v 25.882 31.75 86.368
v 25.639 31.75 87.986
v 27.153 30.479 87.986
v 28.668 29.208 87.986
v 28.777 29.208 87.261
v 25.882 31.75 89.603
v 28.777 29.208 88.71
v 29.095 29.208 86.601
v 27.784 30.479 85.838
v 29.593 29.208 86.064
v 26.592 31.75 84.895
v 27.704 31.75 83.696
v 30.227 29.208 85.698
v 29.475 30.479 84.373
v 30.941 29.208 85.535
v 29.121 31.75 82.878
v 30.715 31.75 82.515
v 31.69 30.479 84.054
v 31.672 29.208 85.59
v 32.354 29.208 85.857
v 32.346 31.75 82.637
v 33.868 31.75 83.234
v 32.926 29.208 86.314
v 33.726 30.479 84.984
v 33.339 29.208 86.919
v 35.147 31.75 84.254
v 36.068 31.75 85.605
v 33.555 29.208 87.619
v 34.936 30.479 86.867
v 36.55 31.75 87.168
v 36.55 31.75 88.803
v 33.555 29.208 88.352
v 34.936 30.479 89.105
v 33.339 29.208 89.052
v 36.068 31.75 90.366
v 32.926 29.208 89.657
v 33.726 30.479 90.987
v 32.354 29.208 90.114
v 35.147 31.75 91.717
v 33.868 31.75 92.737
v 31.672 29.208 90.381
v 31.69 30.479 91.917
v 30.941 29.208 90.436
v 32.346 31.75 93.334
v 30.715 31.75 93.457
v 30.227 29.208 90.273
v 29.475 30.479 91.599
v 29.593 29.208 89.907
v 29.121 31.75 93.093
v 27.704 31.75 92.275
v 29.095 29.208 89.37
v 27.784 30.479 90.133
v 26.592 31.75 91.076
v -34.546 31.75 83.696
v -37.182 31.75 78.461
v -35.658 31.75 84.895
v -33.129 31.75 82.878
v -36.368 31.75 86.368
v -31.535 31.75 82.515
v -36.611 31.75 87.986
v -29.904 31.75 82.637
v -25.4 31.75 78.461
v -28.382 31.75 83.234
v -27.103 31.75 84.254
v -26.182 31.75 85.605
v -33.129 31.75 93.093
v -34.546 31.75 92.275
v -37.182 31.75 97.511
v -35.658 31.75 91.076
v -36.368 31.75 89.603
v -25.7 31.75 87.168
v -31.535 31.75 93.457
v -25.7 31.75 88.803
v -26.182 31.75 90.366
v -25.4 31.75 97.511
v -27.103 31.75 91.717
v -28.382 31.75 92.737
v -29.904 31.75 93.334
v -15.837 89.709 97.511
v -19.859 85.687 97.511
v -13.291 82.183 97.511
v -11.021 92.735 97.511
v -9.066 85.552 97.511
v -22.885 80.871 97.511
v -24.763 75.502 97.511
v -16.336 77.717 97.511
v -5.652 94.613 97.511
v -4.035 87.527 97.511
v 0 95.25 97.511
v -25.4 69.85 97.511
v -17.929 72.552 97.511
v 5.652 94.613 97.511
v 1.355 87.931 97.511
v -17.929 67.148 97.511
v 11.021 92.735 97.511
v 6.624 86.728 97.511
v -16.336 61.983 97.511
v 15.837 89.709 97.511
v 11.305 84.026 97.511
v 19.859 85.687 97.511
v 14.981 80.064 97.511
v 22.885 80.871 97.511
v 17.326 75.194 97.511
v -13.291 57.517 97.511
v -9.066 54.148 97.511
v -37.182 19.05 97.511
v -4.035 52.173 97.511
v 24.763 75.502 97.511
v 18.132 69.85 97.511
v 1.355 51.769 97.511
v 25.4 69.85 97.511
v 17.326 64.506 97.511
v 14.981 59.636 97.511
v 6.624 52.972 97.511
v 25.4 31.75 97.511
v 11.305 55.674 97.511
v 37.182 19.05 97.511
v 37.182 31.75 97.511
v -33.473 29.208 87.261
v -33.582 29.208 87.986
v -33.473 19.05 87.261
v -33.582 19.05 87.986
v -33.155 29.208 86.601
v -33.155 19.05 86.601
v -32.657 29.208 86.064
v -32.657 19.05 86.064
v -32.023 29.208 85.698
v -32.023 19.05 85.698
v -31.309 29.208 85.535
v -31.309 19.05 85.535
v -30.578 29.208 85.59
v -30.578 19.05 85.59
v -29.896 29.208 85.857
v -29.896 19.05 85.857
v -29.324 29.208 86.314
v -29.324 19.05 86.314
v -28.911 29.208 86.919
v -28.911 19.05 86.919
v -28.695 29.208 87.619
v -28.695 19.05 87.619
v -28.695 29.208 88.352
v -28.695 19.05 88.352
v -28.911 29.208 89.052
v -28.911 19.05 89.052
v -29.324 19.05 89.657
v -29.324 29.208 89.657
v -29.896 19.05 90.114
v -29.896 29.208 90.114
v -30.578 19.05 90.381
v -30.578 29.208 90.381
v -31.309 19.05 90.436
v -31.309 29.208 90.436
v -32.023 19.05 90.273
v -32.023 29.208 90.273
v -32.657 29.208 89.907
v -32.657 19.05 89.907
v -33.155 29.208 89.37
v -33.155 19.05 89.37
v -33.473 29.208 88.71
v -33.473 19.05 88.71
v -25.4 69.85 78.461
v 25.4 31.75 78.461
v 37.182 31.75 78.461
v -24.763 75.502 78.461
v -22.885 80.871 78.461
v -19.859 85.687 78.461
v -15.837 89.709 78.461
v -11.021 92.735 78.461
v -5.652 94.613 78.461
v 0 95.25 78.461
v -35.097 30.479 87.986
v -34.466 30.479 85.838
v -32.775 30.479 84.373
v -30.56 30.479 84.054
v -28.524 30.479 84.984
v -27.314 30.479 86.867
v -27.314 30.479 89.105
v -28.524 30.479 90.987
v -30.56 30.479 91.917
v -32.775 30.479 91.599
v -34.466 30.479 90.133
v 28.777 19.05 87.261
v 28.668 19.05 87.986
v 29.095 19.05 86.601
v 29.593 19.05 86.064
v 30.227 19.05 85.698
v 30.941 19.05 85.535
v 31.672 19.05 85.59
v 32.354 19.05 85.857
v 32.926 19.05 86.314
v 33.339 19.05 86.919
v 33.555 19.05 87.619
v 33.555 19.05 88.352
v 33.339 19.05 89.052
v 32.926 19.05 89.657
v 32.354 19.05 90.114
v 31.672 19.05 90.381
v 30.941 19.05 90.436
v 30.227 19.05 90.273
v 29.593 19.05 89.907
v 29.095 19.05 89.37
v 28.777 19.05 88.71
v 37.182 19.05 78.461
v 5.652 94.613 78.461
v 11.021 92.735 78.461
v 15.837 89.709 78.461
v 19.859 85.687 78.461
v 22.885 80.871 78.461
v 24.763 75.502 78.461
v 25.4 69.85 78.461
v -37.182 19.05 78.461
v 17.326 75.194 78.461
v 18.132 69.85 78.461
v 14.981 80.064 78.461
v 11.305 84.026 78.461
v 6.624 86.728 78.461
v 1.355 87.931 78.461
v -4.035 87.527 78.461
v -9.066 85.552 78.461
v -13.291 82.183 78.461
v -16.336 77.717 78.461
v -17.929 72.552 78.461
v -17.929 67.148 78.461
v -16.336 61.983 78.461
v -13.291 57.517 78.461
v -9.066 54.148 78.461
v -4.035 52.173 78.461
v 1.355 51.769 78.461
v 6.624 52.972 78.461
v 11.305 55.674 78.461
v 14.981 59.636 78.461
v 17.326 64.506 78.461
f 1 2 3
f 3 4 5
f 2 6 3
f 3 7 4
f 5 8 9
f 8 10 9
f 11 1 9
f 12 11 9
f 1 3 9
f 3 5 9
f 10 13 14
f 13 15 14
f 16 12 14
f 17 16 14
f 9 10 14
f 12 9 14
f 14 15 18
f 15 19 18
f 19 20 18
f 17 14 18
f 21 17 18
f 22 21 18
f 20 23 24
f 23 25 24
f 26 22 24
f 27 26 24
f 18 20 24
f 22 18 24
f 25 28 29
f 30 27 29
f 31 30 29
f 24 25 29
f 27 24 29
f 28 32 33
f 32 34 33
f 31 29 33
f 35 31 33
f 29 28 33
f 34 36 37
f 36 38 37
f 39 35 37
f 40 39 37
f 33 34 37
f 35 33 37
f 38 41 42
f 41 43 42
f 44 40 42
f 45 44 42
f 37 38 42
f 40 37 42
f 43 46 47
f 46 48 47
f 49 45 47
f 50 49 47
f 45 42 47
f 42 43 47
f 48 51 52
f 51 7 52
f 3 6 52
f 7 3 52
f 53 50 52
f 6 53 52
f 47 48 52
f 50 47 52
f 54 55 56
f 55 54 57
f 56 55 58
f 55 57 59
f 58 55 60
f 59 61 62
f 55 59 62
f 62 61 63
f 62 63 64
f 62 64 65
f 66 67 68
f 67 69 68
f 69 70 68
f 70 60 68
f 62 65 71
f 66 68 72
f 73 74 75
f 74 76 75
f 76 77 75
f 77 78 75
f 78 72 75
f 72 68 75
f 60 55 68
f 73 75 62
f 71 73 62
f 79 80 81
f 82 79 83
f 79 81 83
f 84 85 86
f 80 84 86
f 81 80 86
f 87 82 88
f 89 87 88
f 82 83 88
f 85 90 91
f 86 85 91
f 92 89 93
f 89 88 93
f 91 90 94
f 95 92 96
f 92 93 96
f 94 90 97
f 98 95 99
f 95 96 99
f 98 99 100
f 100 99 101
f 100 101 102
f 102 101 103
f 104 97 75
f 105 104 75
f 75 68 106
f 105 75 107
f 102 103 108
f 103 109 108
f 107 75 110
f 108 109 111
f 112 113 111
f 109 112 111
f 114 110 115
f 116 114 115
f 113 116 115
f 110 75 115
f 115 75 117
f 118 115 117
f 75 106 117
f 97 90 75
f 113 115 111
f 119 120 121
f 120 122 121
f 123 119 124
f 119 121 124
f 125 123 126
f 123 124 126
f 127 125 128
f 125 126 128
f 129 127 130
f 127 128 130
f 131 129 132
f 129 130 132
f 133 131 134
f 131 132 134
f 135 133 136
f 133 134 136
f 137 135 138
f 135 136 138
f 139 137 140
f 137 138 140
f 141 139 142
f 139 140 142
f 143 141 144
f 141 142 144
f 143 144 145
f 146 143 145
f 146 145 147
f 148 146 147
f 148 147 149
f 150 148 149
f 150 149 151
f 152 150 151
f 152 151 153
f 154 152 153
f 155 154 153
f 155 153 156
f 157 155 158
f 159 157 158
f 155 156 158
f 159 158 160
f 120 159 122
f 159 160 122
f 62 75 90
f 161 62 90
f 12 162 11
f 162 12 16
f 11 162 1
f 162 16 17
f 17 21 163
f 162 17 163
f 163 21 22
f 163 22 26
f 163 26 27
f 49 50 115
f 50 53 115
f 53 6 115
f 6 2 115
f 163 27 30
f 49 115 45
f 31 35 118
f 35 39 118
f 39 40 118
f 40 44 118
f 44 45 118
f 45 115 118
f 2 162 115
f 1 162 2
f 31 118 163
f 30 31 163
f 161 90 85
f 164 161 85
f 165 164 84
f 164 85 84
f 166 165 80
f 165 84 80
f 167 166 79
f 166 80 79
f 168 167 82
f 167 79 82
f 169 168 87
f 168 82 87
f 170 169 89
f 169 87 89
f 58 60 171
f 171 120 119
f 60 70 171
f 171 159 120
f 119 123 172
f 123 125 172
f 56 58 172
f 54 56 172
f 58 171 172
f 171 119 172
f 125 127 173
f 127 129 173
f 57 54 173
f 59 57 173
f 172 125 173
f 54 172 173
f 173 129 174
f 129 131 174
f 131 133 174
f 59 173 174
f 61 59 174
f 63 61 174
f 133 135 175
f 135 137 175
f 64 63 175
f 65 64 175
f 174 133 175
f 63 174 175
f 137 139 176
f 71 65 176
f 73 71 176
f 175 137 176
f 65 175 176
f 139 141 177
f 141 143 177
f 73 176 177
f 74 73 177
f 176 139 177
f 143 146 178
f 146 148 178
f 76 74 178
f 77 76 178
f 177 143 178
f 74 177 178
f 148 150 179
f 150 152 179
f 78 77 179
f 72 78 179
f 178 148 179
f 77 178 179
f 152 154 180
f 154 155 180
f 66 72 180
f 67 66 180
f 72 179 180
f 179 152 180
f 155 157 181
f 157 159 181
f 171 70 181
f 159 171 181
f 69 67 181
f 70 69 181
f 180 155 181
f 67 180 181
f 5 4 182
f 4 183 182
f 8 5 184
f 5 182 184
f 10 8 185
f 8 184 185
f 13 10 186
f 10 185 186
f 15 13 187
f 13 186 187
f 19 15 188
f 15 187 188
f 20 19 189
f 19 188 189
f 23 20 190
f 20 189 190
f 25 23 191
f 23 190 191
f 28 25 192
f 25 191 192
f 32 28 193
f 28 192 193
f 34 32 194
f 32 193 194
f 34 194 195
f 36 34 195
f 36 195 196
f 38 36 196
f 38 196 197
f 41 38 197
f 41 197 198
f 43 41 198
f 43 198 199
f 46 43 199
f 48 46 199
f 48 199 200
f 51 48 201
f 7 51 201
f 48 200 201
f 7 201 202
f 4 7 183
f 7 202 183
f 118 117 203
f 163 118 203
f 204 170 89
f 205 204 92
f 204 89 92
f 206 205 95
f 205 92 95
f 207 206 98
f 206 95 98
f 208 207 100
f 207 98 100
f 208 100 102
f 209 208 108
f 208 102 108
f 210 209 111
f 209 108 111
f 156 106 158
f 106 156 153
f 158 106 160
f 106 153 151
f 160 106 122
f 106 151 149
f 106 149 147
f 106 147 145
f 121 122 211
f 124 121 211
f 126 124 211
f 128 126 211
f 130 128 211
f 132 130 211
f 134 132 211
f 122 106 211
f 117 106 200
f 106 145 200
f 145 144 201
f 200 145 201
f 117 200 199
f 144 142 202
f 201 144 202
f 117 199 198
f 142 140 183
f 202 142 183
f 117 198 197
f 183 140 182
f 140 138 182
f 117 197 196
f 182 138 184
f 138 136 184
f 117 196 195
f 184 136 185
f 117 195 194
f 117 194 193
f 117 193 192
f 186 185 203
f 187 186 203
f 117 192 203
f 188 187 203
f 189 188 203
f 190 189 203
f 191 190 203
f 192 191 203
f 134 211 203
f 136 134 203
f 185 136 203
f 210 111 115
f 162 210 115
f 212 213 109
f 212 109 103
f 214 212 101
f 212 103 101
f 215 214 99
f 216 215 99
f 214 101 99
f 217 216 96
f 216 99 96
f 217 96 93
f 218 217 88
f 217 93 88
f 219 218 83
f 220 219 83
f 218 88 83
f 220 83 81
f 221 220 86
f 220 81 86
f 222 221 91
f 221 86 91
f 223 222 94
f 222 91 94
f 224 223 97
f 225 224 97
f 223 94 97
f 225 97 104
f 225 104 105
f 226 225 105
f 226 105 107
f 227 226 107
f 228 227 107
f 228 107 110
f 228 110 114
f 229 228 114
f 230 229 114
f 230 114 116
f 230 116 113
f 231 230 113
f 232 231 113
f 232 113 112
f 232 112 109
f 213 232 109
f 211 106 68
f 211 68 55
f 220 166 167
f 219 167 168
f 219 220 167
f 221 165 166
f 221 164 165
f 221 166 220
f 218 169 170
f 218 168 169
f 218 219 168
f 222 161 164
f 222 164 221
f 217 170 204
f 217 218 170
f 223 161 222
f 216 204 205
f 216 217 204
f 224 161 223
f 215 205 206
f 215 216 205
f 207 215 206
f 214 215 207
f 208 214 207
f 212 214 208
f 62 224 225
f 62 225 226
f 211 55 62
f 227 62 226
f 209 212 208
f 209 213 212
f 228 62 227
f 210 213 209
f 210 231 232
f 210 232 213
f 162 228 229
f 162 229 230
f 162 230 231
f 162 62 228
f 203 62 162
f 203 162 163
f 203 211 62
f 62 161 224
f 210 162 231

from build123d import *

# Parameters (mm, degrees)
SKETCH1_W                                         = 74.3632
SKETCH1_H                                         = 19.05
BOSS_EXTRUDE2_DEPTH                               = 76.2
SKETCH2_R                                         = 18.1316
CUT_EXTRUDE1_DEPTH                                = 20.05
CSK_FOR_8_FLAT_HEAD_MACHINE_SCREW_100_D           = 4.9149
CSK_FOR_8_FLAT_HEAD_MACHINE_SCREW_100_CSINK_D     = 10.9728
CSK_FOR_8_FLAT_HEAD_MACHINE_SCREW_100_CSINK_ANGLE = 100


with BuildPart() as part:
    # Sketch1 → Boss-Extrude2 (new body)
    with BuildSketch(Plane(origin=(0, 19.05, 0), x_dir=(1, 0, 0), z_dir=(0, 1, 0))):
        with Locations((0, -87.9856)):
            Rectangle(SKETCH1_W, SKETCH1_H)
    extrude(amount=BOSS_EXTRUDE2_DEPTH)

    # Sketch2 → Cut-Extrude1 (cut, through all)
    with BuildSketch(Plane.XY.offset(97.5106)):
        with BuildLine():
            Line((-37.1816, 95.25), (-37.1816, 31.75))
            Line((-37.1816, 31.75), (-25.4, 31.75))
            Line((-25.4, 31.75), (-25.4, 69.85))
            ThreePointArc((-25.4, 69.85), (-17.960512267, 87.810512217), (-7.1e-08, 95.25))
            Line((-7.1e-08, 95.25), (-37.1816, 95.25))
        make_face()
        with BuildLine():
            Line((25.4, 69.85), (25.4, 31.75))
            Line((25.4, 31.75), (37.1816, 31.75))
            Line((37.1816, 31.75), (37.1816, 95.25))
            Line((37.1816, 95.25), (-7.1e-08, 95.25))
            ThreePointArc((-7.1e-08, 95.25), (17.960512217, 87.810512267), (25.4, 69.85))
        make_face()
        with Locations((0, 69.85)):
            Circle(SKETCH2_R)
    extrude(amount=-CUT_EXTRUDE1_DEPTH, mode=Mode.SUBTRACT)

    # CSK for #8 Flat Head Machine Screw (100)1 (through all)
    with Locations(Plane(origin=(0, 31.75, 0), x_dir=(1, 0, 0), z_dir=(0, 1, 0))):
        with Locations((-31.125, -87.9856), (31.125, -87.9856)):
            CounterSinkHole(CSK_FOR_8_FLAT_HEAD_MACHINE_SCREW_100_D / 2, CSK_FOR_8_FLAT_HEAD_MACHINE_SCREW_100_CSINK_D / 2, counter_sink_angle=CSK_FOR_8_FLAT_HEAD_MACHINE_SCREW_100_CSINK_ANGLE)


solid = part.part
